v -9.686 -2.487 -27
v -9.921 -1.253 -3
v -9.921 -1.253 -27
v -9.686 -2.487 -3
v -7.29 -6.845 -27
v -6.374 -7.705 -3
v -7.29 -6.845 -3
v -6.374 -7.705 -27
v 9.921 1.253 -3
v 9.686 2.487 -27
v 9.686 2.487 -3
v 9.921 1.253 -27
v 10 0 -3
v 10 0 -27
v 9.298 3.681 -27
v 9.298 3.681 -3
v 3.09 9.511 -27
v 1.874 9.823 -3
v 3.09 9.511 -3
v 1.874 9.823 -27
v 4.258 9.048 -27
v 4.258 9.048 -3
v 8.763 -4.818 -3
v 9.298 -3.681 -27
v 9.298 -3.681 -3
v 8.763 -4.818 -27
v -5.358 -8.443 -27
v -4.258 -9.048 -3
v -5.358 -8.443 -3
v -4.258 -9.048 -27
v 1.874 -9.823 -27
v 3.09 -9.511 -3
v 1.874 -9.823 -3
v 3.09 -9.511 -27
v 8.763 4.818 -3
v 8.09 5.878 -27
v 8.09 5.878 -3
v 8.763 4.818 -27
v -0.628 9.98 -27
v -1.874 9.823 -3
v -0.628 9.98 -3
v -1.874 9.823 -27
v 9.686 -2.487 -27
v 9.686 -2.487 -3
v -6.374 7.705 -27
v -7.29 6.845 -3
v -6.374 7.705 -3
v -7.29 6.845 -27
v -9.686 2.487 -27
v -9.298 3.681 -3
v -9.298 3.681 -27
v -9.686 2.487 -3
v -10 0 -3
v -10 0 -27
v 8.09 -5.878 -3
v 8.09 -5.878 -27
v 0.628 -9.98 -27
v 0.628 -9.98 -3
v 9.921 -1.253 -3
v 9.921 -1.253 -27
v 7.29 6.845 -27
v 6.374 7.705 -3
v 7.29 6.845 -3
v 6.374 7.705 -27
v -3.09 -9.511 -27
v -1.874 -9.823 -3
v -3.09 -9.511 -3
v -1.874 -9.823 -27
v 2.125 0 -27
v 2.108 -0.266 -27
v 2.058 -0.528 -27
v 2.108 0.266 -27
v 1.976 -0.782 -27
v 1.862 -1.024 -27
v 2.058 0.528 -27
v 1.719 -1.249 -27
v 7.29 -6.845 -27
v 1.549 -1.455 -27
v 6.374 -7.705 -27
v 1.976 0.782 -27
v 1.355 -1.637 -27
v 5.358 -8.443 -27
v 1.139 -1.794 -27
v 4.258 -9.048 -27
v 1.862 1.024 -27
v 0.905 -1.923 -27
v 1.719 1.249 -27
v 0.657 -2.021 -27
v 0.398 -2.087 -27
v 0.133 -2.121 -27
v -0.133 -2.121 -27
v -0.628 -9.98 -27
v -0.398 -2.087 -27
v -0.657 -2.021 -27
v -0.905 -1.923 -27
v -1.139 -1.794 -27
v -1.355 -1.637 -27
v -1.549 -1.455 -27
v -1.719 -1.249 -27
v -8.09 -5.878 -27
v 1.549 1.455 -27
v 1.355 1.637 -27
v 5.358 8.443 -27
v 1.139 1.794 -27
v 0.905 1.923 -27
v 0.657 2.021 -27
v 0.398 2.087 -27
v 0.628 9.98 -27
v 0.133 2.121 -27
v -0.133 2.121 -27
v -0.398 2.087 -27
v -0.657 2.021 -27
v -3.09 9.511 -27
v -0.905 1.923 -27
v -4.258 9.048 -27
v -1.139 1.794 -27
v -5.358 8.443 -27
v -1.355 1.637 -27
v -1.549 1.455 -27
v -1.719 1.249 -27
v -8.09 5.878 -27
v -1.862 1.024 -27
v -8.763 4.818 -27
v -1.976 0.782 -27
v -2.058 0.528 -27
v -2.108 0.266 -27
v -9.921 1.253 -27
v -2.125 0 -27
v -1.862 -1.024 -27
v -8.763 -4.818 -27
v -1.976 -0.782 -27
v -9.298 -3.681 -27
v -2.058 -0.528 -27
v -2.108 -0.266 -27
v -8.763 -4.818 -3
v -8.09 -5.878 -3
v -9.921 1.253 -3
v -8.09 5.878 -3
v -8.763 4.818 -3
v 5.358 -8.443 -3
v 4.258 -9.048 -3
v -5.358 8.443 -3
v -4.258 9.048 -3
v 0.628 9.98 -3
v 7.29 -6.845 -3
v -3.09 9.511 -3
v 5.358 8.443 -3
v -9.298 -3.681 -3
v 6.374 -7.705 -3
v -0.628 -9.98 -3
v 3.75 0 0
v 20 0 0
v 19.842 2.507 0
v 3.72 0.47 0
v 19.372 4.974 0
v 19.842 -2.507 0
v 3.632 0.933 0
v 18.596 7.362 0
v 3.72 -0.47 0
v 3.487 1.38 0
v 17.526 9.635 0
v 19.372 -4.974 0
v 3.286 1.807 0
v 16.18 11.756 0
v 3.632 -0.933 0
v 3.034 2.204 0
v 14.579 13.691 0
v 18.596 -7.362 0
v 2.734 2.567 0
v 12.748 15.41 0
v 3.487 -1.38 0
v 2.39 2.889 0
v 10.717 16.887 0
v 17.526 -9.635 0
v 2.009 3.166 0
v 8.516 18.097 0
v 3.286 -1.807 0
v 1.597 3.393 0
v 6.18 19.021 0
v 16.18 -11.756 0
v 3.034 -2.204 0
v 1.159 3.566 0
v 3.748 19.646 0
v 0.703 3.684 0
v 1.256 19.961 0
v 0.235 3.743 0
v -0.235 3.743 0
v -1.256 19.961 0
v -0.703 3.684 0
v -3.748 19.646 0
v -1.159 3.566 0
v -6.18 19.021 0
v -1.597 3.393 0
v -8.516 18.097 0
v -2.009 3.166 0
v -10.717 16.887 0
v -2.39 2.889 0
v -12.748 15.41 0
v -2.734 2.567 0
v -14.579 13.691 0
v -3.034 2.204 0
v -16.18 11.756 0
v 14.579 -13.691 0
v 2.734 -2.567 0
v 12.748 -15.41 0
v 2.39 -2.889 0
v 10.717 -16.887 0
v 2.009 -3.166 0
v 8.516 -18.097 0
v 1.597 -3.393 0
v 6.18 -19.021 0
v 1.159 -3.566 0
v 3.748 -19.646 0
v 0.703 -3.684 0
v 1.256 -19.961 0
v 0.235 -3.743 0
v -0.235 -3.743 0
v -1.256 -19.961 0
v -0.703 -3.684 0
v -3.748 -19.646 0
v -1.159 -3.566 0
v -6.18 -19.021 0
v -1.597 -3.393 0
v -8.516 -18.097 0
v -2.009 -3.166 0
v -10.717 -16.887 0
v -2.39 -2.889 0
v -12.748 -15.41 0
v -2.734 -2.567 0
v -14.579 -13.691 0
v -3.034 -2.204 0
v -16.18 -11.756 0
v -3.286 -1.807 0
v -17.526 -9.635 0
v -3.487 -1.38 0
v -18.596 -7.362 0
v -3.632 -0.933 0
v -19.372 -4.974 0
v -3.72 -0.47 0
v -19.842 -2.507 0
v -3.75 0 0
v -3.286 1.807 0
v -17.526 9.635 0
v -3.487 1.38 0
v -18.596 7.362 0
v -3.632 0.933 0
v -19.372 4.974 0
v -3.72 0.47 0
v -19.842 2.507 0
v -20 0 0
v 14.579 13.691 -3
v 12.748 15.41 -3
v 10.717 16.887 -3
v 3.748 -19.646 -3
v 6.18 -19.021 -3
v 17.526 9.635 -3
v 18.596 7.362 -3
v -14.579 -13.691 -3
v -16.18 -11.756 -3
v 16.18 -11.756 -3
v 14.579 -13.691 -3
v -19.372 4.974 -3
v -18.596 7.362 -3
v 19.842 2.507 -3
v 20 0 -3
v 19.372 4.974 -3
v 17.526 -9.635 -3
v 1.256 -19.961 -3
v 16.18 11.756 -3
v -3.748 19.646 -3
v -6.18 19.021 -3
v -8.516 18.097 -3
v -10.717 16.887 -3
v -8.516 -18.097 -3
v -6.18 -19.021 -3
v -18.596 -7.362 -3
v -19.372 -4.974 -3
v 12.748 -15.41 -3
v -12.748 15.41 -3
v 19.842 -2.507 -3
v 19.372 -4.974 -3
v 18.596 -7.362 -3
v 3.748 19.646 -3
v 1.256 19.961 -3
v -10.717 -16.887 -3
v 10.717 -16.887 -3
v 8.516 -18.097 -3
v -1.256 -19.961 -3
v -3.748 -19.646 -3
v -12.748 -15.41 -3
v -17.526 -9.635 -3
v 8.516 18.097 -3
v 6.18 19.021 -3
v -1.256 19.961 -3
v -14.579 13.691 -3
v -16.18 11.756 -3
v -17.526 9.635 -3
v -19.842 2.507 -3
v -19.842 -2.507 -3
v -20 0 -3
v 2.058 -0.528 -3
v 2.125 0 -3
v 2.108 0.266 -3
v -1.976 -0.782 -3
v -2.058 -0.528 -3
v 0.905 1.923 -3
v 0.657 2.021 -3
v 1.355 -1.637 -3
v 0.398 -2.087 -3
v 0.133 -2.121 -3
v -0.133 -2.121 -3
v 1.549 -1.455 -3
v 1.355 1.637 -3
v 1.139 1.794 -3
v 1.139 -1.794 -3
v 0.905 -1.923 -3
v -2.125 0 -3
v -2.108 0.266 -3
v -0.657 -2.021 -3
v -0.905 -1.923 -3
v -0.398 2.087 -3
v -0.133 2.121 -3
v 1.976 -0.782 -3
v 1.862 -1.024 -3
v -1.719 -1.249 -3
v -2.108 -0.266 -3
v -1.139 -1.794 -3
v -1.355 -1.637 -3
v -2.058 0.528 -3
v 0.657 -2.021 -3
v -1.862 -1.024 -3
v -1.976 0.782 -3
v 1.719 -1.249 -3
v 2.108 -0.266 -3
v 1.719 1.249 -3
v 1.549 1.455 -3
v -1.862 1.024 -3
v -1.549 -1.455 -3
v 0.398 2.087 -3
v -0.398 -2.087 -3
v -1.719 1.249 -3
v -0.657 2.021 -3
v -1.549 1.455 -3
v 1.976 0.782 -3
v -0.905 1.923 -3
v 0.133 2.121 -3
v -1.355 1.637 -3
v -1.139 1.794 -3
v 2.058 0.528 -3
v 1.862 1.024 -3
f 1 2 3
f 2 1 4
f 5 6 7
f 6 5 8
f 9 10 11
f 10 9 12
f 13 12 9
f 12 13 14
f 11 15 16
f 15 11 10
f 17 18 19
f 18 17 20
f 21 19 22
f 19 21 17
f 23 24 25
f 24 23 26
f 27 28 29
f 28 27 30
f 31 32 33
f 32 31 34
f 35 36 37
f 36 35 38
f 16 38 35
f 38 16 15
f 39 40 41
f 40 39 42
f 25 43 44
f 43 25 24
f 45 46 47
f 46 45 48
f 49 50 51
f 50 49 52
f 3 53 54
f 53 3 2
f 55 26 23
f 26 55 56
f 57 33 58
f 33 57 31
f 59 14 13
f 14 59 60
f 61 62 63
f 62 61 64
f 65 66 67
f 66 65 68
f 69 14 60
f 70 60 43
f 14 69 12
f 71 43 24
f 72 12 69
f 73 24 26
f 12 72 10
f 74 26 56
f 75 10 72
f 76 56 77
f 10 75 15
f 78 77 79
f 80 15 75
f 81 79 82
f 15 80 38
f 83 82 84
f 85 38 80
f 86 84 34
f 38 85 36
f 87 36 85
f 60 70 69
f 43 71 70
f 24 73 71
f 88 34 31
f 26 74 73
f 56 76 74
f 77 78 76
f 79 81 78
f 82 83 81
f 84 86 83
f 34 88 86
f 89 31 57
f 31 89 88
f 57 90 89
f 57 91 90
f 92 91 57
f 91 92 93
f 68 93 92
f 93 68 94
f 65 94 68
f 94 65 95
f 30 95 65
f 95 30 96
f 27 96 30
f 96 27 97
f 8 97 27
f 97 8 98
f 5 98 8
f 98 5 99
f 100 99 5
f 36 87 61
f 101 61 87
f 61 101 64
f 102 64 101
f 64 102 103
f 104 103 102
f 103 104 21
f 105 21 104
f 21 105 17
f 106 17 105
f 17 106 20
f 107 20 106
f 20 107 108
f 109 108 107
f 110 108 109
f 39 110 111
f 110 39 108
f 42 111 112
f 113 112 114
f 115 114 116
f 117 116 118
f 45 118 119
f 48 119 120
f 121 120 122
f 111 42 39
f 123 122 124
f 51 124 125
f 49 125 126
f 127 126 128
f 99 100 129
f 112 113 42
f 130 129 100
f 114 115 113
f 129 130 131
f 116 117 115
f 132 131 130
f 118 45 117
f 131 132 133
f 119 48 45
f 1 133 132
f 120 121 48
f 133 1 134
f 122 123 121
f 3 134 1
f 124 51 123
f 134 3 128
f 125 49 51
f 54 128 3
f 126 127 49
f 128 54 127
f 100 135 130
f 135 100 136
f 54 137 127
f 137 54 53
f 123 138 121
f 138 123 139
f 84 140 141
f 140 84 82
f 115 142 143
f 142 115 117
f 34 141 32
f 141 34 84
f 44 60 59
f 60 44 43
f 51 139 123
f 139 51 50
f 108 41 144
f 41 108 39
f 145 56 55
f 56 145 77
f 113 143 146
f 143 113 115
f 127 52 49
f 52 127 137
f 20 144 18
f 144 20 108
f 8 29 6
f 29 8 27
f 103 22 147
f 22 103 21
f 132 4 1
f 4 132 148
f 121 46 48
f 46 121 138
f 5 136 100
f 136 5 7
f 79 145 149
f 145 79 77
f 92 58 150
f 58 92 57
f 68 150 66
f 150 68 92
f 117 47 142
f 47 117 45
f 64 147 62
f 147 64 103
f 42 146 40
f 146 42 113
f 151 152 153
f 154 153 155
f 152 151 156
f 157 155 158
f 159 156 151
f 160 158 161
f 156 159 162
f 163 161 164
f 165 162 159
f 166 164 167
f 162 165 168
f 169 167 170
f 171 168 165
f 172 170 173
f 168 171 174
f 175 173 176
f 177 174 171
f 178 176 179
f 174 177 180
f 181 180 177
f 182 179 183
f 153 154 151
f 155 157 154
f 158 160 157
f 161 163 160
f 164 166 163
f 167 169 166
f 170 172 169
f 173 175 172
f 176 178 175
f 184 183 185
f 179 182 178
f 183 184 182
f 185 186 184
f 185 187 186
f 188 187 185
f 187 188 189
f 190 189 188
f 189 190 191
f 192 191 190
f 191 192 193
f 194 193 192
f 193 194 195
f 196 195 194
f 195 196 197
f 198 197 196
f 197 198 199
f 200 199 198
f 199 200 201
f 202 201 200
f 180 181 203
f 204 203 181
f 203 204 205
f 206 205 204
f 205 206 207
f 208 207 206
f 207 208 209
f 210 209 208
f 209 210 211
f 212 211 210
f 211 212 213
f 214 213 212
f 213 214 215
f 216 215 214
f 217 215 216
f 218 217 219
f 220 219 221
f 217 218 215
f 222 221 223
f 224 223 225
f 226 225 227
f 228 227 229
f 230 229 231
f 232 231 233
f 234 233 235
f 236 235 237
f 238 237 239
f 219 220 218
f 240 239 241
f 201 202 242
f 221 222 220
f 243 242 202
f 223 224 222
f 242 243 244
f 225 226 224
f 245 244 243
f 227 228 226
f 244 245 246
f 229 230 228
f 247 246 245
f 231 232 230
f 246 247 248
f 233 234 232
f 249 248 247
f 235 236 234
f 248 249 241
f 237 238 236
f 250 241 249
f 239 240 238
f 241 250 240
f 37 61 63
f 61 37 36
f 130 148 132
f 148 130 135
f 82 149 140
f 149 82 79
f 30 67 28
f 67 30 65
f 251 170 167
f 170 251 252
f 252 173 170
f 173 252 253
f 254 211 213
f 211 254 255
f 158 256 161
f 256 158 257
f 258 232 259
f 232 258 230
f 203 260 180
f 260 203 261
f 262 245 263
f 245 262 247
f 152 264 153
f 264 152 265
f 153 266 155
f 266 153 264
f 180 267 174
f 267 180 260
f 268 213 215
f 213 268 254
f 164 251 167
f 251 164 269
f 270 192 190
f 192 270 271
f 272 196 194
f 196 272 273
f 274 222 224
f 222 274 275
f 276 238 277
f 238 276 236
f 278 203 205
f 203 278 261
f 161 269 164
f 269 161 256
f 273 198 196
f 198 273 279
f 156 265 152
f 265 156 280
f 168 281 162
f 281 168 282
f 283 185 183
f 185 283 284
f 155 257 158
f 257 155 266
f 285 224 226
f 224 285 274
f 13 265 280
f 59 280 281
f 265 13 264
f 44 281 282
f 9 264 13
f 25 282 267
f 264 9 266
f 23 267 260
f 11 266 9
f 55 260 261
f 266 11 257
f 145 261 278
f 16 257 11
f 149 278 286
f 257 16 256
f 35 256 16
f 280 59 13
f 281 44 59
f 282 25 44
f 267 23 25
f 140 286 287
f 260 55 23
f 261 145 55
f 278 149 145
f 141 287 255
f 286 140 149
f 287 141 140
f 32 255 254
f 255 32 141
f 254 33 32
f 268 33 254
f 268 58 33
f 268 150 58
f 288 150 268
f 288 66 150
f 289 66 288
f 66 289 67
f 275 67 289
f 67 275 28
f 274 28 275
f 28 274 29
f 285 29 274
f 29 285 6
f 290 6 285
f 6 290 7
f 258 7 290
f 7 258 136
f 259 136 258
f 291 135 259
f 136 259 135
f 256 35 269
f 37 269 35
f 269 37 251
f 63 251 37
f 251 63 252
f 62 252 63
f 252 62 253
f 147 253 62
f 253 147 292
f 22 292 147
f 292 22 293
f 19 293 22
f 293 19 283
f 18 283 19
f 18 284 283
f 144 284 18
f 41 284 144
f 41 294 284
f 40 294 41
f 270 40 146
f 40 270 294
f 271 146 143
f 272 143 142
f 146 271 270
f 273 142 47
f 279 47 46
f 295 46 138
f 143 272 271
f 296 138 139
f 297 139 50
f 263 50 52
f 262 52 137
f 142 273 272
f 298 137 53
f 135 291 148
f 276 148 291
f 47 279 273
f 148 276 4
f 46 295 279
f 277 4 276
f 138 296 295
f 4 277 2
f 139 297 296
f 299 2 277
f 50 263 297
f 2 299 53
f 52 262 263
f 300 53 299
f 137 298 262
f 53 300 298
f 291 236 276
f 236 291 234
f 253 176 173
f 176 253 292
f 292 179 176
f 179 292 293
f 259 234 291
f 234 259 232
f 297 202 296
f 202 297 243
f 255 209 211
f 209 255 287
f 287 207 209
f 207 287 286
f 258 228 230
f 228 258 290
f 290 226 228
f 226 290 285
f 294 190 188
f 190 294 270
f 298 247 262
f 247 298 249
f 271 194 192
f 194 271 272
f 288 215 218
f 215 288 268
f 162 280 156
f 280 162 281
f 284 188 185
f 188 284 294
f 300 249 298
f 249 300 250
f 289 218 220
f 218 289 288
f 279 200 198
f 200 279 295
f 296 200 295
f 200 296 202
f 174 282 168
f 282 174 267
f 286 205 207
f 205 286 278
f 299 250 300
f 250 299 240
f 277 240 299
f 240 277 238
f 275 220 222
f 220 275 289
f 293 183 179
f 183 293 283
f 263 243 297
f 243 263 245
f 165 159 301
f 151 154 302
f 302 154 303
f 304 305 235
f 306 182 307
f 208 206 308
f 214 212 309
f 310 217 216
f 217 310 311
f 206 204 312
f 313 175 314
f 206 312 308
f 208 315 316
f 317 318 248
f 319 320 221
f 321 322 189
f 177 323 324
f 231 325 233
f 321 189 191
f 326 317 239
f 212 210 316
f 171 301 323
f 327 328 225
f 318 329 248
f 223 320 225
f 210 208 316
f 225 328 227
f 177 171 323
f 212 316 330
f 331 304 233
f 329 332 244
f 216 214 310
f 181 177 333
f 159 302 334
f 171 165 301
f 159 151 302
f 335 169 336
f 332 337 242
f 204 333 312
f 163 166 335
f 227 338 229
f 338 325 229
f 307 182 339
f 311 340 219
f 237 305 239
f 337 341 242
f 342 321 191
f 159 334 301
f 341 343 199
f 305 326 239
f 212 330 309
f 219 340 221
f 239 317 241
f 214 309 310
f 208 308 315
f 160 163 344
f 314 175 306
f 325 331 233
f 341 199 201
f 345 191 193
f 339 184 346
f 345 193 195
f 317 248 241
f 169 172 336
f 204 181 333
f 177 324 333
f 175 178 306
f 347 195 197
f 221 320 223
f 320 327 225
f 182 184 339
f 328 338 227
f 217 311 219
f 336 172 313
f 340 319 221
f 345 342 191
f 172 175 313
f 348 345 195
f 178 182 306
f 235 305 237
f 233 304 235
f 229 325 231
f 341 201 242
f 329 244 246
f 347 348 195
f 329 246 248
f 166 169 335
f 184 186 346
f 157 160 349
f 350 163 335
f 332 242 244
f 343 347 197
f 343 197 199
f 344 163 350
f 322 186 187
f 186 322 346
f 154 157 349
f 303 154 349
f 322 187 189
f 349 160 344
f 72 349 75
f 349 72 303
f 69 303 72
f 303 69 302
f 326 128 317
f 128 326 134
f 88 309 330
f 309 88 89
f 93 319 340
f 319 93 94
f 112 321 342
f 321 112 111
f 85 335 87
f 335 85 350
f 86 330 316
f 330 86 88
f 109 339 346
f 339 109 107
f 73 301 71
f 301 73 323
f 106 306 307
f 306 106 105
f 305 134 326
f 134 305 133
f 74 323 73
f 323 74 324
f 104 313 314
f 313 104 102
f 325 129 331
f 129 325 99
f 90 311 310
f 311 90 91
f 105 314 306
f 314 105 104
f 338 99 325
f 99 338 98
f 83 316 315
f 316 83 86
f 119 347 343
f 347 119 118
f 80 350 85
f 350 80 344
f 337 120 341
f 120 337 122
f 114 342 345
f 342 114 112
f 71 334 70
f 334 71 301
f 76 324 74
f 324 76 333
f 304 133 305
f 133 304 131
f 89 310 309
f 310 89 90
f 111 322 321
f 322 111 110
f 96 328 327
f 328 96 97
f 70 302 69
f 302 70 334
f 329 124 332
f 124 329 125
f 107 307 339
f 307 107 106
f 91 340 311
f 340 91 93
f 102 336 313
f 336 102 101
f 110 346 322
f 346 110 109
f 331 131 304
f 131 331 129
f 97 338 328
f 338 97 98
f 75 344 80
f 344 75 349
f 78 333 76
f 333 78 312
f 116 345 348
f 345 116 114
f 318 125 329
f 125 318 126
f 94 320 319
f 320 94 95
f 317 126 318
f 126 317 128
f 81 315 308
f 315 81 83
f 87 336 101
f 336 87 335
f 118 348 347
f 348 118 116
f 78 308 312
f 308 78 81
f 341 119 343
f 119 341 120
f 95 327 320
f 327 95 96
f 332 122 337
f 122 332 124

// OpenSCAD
$fn = 50;


difference() {
	union() {
		translate(v = [0, 0, -27.0000000000]) {
			cylinder(h = 27, r = 10.0000000000);
		}
		translate(v = [0, 0, -3.0000000000]) {
			cylinder(h = 3, r = 20.0000000000);
		}
	}
	union() {
		translate(v = [0, 0, 0]) {
			rotate(a = [0, 0, 0]) {
				difference() {
					union() {
						#translate(v = [0, 0, -27.0000000000]) {
							cylinder(h = 27, r = 2.0000000000);
						}
						#translate(v = [0, 0, -3]) {
							cylinder(h = 3, r1 = 2.1250000000, r2 = 3.7500000000);
						}
						#translate(v = [0, 0, -27.0000000000]) {
							cylinder(h = 27, r = 2.1250000000);
						}
						#translate(v = [0, 0, -27.0000000000]) {
							cylinder(h = 27, r = 2.0000000000);
						}
					}
					union();
				}
			}
		}
	}
}
